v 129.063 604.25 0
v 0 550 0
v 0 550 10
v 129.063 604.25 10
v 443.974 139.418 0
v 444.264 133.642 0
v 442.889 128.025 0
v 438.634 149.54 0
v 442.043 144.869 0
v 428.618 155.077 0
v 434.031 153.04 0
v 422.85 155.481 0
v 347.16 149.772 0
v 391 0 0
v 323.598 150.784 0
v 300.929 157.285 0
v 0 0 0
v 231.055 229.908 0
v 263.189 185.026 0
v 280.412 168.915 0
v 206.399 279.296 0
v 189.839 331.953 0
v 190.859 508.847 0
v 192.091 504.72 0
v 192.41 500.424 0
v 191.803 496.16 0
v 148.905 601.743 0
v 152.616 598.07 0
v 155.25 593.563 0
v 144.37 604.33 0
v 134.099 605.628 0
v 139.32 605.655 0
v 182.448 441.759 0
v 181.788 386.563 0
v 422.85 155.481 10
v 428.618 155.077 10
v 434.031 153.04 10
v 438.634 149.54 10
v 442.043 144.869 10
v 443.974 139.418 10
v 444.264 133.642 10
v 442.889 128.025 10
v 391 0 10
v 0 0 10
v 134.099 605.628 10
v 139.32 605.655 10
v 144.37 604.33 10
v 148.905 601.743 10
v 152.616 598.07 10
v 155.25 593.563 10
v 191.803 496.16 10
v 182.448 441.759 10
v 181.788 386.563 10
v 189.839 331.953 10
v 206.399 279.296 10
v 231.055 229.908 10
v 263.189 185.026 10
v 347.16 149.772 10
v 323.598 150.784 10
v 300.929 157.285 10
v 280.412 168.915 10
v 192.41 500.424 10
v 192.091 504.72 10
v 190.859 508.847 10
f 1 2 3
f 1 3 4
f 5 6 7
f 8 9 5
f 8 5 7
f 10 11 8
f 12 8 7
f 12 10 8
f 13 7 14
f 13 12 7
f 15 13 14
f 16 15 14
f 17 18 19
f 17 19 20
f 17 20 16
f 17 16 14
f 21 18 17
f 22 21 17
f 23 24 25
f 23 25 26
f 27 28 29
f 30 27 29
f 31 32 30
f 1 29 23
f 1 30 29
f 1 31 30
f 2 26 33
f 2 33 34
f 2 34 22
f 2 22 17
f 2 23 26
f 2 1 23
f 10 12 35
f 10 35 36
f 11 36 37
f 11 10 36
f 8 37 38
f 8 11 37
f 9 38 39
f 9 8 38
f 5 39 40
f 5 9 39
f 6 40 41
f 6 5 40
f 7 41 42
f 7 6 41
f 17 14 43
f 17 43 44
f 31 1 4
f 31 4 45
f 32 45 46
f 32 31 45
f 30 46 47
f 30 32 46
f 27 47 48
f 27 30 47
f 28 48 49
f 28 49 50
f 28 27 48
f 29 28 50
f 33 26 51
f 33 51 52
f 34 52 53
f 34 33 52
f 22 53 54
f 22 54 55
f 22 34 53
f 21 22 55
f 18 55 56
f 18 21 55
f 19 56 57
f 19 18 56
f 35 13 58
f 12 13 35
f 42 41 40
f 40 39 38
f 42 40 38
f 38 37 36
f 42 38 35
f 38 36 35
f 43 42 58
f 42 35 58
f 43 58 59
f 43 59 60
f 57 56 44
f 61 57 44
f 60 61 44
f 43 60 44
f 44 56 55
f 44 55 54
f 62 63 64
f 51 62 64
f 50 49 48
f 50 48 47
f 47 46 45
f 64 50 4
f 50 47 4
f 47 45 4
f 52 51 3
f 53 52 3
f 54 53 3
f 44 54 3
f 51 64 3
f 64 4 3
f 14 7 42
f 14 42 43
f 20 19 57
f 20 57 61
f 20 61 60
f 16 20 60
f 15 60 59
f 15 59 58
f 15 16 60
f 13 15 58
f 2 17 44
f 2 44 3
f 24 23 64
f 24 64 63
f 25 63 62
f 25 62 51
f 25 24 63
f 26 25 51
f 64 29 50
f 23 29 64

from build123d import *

# Parameters (mm, degrees)
BOSS_EXTRU_1_DEPTH = 10


with BuildPart() as part:
    # Esquisse1 → Boss.-Extru.1 (new body)
    with BuildSketch(Plane.XY):
        with BuildLine():
            Line((0, 0), (0, 550))
            Line((0, 550), (129.062590026, 604.250037842))
            ThreePointArc((129.062590026, 604.250037842), (144.369719008, 604.329896284), (155.249962158, 593.562590026))
            Line((155.249962158, 593.562590026), (190.859025666, 508.847479263))
            ThreePointArc((190.859025666, 508.847479263), (192.366539865, 502.580756708), (191.802553764, 496.159983364))
            ThreePointArc((191.802553764, 496.159983364), (189.838676364, 331.953031603), (263.189381841, 185.026336182))
            ThreePointArc((263.189381841, 185.026336182), (300.928689878, 157.28521303), (347.160451012, 149.771921656))
            Line((347.160451012, 149.771921656), (422.849515254, 155.480705177))
            ThreePointArc((422.849515254, 155.480705177), (440.508345068, 147.328376864), (442.889156647, 128.024841862))
            Line((442.889156647, 128.024841862), (391, 0))
            Line((391, 0), (0, 0))
        make_face()
    extrude(amount=BOSS_EXTRU_1_DEPTH)


solid = part.part
